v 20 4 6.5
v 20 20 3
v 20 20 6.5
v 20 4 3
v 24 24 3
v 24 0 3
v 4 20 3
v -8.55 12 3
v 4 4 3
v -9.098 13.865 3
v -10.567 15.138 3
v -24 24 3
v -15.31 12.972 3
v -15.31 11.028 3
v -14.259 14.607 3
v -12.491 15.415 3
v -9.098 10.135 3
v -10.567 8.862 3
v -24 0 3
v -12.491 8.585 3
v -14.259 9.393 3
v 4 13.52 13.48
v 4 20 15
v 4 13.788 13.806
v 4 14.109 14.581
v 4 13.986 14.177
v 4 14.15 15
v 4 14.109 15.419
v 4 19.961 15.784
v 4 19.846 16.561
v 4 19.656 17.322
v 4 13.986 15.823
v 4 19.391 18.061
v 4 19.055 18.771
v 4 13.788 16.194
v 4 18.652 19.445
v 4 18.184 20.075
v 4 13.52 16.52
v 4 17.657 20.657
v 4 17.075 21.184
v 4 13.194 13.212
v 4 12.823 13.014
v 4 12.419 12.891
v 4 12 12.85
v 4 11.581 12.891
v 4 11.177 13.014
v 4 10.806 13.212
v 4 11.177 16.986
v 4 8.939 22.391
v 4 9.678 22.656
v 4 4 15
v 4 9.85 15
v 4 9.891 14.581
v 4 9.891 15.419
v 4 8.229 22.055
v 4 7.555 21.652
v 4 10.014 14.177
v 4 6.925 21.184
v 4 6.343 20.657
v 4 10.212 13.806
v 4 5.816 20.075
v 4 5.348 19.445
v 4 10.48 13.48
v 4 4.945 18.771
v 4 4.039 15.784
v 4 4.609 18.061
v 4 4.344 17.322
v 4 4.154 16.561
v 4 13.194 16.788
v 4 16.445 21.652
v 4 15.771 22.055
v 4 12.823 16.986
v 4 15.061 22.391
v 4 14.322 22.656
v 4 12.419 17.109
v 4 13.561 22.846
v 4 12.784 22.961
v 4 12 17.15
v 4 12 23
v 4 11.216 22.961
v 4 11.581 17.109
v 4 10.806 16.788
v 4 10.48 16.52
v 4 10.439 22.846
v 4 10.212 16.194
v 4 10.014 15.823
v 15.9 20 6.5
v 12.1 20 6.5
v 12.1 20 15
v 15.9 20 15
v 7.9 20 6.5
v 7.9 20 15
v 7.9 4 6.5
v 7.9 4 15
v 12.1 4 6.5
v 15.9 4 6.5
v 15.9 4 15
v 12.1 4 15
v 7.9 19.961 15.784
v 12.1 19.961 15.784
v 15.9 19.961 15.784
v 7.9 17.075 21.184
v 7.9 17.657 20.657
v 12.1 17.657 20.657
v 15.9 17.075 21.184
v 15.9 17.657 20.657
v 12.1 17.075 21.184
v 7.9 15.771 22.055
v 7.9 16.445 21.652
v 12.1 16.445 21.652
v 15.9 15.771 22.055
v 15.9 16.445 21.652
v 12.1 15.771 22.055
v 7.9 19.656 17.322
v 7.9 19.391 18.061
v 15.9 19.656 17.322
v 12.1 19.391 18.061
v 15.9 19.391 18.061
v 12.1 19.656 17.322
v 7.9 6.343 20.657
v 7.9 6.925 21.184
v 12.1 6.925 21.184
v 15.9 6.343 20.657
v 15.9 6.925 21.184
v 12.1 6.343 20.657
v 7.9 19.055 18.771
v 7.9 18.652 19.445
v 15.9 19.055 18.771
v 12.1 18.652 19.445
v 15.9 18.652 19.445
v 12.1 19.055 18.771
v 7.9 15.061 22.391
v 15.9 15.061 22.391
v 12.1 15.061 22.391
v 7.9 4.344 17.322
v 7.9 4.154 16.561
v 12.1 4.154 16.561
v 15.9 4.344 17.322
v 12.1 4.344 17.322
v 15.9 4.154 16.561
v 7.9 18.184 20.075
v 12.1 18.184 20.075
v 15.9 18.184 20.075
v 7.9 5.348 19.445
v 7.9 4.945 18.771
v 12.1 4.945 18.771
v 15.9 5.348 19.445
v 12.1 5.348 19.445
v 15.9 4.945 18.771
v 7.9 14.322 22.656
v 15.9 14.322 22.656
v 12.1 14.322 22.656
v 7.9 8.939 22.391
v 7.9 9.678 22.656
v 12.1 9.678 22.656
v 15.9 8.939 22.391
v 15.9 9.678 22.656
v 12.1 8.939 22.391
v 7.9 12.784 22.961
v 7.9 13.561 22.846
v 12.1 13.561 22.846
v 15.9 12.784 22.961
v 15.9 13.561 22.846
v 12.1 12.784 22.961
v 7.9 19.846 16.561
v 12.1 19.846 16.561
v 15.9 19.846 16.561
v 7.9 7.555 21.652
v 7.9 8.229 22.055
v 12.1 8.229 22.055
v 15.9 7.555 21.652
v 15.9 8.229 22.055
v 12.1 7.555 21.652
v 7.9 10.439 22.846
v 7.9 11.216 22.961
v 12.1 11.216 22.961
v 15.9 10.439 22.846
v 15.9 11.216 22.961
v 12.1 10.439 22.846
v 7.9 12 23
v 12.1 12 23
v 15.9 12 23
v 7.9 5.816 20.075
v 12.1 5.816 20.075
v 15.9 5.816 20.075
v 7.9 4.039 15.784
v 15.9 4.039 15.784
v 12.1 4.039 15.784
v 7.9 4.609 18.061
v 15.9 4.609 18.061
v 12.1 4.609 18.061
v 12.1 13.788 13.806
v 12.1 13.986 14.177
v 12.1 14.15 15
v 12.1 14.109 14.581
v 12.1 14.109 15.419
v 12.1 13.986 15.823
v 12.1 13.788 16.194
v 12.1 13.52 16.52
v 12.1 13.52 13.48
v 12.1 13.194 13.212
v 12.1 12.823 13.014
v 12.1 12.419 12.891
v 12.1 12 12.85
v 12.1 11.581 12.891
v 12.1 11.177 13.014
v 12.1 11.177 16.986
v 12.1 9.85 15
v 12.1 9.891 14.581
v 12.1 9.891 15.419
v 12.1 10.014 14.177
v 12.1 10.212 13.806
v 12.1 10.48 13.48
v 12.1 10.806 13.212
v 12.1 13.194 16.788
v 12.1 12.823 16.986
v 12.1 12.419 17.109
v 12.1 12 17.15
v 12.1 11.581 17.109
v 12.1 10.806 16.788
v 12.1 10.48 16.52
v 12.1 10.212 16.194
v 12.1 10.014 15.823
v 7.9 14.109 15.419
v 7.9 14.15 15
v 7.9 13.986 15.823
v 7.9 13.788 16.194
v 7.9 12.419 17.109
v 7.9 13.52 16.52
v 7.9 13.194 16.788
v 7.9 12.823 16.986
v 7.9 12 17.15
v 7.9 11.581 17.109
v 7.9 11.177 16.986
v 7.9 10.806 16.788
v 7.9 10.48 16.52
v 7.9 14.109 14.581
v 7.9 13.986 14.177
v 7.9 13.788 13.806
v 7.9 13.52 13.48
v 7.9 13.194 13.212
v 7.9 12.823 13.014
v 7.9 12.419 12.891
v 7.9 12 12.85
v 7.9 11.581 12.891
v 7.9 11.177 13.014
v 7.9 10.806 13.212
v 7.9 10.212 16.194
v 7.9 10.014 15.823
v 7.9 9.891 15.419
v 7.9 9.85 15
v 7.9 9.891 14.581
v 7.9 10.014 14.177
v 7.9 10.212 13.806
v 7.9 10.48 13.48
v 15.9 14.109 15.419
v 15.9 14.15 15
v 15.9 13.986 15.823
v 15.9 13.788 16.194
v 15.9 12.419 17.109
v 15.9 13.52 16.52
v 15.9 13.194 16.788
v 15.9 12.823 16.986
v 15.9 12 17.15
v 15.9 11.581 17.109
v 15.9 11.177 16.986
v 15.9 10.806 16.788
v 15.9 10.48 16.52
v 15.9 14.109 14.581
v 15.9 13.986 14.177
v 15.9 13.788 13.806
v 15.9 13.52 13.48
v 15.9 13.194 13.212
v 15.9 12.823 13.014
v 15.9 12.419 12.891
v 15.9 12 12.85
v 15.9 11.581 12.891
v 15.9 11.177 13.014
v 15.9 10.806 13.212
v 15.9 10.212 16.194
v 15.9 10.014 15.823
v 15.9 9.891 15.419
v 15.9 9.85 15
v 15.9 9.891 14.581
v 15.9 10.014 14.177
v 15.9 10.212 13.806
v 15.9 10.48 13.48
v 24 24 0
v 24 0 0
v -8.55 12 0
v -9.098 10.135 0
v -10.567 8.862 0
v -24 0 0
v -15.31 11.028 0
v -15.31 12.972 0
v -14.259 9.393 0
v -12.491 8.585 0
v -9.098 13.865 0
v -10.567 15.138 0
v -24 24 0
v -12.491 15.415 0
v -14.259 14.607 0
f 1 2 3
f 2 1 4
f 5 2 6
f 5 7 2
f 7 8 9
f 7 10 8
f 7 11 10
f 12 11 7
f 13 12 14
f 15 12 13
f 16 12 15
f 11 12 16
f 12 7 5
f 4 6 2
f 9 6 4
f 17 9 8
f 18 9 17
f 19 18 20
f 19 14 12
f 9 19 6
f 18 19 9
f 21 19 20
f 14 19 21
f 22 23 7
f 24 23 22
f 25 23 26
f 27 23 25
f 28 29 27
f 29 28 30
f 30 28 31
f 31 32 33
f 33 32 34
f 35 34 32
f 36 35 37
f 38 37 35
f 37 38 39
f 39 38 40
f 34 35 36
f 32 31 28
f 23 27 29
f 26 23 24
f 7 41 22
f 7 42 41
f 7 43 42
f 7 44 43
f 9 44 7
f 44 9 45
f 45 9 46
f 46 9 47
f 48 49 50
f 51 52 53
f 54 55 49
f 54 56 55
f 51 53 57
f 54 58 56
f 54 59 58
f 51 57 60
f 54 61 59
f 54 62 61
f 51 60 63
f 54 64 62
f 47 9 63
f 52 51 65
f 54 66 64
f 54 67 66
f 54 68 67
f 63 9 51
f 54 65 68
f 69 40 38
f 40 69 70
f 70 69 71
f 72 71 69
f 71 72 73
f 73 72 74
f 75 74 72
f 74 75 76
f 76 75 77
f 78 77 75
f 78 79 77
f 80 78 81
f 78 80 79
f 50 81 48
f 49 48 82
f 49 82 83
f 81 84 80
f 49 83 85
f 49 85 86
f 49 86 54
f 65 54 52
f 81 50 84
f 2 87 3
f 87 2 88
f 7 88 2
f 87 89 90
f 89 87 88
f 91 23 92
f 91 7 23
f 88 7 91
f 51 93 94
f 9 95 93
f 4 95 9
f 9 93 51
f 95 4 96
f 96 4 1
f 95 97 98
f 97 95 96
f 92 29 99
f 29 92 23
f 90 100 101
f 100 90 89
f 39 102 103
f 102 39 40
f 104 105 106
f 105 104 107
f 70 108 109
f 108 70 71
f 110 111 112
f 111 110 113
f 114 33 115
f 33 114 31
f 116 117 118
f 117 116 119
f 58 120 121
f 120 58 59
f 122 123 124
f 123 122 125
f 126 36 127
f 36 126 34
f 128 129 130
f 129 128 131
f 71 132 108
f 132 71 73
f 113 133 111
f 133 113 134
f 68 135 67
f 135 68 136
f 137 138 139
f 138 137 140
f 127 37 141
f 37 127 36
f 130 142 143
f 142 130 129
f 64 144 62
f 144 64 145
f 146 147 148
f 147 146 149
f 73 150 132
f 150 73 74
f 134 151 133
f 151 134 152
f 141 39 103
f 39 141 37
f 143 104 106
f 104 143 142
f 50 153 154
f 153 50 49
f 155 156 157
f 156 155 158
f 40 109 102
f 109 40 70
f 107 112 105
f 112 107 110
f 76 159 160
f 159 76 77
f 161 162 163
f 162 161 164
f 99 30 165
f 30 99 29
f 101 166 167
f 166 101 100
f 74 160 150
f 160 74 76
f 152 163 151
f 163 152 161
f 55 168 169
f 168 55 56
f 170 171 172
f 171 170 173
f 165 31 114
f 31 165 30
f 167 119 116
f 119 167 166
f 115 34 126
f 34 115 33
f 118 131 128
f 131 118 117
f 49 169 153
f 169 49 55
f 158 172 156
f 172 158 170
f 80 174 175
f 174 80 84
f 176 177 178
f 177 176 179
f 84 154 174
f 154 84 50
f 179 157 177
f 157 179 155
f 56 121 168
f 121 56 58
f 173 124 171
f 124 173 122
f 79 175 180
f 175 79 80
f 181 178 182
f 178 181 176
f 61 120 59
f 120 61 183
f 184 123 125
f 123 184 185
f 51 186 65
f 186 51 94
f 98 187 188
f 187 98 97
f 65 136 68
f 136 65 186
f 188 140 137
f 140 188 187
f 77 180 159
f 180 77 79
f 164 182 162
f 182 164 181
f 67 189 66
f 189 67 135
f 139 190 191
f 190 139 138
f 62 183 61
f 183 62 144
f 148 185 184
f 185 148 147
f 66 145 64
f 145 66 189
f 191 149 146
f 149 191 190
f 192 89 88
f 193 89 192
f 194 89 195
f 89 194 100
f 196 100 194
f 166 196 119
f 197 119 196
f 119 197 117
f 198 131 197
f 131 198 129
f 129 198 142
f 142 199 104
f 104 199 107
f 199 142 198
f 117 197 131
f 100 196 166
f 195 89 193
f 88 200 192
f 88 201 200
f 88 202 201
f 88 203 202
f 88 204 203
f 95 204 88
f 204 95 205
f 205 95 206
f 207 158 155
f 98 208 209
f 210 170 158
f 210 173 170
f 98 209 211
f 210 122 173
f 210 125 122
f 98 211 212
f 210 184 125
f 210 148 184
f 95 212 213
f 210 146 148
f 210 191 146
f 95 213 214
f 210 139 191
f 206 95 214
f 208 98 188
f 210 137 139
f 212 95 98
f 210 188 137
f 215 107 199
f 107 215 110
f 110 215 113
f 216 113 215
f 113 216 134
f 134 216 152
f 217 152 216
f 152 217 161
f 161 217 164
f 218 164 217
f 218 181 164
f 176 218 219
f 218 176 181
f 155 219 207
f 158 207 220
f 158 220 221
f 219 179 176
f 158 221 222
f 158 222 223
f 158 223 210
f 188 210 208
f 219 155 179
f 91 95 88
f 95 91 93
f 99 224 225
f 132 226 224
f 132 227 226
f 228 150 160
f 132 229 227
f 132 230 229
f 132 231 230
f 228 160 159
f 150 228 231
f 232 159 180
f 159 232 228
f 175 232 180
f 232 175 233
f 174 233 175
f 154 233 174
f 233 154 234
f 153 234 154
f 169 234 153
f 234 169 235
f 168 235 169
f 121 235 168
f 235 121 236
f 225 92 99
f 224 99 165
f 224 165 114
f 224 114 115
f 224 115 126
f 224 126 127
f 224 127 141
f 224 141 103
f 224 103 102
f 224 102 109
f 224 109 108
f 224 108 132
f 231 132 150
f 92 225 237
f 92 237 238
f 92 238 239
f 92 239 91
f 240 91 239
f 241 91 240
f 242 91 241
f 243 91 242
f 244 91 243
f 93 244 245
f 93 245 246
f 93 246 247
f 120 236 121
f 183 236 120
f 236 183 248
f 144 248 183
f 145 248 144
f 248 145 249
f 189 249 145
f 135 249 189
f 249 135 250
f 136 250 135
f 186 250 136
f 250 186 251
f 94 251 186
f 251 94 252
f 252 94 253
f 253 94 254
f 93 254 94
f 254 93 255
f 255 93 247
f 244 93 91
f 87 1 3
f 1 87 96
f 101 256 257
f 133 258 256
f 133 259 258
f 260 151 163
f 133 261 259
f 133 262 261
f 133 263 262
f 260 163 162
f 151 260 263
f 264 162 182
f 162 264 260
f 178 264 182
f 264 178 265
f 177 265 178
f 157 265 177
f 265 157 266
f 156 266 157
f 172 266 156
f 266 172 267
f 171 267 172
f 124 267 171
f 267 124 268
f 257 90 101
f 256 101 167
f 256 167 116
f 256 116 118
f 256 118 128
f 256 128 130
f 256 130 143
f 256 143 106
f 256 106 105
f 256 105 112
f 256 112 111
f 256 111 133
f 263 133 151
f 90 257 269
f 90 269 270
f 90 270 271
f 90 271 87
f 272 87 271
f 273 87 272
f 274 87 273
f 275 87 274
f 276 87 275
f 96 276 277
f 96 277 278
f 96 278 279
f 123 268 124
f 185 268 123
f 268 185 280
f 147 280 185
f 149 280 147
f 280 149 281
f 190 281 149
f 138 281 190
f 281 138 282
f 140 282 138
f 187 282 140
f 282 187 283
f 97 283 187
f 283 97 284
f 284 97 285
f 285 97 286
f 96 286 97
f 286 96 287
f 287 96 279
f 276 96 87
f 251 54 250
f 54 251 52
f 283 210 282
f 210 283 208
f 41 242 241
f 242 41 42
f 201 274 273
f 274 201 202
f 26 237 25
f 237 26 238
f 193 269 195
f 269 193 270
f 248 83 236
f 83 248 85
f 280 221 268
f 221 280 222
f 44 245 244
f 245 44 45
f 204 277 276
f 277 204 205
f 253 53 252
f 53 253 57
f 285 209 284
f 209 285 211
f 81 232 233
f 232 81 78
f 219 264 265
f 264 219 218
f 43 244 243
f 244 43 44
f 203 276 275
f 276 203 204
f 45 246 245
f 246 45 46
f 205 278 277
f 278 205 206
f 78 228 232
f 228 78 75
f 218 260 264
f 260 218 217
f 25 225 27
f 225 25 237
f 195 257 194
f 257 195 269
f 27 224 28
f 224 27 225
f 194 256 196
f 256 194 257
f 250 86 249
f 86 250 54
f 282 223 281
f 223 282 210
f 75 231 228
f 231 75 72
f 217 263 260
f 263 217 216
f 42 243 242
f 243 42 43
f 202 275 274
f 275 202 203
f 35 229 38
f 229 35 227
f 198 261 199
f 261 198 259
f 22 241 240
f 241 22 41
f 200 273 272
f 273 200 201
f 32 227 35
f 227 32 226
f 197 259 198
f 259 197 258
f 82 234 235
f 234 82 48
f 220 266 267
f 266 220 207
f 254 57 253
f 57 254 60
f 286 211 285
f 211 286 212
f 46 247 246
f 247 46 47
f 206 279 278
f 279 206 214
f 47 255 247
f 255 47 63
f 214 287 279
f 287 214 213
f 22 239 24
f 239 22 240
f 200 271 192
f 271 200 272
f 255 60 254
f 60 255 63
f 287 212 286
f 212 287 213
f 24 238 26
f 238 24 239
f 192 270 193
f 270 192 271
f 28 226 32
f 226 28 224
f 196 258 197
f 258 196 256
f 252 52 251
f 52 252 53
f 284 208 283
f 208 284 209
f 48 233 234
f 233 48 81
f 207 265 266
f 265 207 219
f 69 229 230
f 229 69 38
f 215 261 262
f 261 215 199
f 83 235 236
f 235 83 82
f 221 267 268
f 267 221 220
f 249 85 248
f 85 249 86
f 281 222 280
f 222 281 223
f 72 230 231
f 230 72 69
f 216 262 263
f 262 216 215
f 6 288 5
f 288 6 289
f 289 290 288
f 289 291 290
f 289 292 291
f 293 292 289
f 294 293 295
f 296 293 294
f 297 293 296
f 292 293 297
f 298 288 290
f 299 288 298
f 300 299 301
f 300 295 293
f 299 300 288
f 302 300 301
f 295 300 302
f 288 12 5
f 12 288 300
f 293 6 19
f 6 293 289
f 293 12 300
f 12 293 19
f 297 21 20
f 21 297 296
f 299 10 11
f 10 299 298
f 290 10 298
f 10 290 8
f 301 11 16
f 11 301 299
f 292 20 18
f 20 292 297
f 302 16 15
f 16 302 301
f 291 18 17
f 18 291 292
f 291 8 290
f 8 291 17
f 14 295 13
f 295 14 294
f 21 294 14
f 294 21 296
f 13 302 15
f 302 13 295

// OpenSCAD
union() {
	union() {
		cube(size = [24, 24, 3]);
		translate(v = [4, 4, 3]) {
			difference() {
				union() {
					cube(size = [16, 16, 12]);
					translate(v = [0, 8, 12]) {
						rotate(a = 90, v = [0, 1, 0]) {
							cylinder($fn = 64, h = 16, r = 8);
						}
					}
				}
				union() {
					translate(v = [3.9000000000, 0, 3.5000000000]) {
						cube(size = [4.2000000000, 16, 25]);
					}
					translate(v = [11.9000000000, 0, 3.5000000000]) {
						cube(size = [4.2000000000, 16, 25]);
					}
					translate(v = [0, 8, 12]) {
						rotate(a = 90, v = [0, 1, 0]) {
							cylinder($fn = 32, h = 16, r = 2.1500000000);
						}
					}
				}
			}
		}
	}
	translate(v = [-24, 0, 0]) {
		difference() {
			cube(size = [24, 24, 3]);
			translate(v = [12, 12, 0]) {
				cylinder(h = 3, r = 3.4500000000);
			}
		}
	}
}
